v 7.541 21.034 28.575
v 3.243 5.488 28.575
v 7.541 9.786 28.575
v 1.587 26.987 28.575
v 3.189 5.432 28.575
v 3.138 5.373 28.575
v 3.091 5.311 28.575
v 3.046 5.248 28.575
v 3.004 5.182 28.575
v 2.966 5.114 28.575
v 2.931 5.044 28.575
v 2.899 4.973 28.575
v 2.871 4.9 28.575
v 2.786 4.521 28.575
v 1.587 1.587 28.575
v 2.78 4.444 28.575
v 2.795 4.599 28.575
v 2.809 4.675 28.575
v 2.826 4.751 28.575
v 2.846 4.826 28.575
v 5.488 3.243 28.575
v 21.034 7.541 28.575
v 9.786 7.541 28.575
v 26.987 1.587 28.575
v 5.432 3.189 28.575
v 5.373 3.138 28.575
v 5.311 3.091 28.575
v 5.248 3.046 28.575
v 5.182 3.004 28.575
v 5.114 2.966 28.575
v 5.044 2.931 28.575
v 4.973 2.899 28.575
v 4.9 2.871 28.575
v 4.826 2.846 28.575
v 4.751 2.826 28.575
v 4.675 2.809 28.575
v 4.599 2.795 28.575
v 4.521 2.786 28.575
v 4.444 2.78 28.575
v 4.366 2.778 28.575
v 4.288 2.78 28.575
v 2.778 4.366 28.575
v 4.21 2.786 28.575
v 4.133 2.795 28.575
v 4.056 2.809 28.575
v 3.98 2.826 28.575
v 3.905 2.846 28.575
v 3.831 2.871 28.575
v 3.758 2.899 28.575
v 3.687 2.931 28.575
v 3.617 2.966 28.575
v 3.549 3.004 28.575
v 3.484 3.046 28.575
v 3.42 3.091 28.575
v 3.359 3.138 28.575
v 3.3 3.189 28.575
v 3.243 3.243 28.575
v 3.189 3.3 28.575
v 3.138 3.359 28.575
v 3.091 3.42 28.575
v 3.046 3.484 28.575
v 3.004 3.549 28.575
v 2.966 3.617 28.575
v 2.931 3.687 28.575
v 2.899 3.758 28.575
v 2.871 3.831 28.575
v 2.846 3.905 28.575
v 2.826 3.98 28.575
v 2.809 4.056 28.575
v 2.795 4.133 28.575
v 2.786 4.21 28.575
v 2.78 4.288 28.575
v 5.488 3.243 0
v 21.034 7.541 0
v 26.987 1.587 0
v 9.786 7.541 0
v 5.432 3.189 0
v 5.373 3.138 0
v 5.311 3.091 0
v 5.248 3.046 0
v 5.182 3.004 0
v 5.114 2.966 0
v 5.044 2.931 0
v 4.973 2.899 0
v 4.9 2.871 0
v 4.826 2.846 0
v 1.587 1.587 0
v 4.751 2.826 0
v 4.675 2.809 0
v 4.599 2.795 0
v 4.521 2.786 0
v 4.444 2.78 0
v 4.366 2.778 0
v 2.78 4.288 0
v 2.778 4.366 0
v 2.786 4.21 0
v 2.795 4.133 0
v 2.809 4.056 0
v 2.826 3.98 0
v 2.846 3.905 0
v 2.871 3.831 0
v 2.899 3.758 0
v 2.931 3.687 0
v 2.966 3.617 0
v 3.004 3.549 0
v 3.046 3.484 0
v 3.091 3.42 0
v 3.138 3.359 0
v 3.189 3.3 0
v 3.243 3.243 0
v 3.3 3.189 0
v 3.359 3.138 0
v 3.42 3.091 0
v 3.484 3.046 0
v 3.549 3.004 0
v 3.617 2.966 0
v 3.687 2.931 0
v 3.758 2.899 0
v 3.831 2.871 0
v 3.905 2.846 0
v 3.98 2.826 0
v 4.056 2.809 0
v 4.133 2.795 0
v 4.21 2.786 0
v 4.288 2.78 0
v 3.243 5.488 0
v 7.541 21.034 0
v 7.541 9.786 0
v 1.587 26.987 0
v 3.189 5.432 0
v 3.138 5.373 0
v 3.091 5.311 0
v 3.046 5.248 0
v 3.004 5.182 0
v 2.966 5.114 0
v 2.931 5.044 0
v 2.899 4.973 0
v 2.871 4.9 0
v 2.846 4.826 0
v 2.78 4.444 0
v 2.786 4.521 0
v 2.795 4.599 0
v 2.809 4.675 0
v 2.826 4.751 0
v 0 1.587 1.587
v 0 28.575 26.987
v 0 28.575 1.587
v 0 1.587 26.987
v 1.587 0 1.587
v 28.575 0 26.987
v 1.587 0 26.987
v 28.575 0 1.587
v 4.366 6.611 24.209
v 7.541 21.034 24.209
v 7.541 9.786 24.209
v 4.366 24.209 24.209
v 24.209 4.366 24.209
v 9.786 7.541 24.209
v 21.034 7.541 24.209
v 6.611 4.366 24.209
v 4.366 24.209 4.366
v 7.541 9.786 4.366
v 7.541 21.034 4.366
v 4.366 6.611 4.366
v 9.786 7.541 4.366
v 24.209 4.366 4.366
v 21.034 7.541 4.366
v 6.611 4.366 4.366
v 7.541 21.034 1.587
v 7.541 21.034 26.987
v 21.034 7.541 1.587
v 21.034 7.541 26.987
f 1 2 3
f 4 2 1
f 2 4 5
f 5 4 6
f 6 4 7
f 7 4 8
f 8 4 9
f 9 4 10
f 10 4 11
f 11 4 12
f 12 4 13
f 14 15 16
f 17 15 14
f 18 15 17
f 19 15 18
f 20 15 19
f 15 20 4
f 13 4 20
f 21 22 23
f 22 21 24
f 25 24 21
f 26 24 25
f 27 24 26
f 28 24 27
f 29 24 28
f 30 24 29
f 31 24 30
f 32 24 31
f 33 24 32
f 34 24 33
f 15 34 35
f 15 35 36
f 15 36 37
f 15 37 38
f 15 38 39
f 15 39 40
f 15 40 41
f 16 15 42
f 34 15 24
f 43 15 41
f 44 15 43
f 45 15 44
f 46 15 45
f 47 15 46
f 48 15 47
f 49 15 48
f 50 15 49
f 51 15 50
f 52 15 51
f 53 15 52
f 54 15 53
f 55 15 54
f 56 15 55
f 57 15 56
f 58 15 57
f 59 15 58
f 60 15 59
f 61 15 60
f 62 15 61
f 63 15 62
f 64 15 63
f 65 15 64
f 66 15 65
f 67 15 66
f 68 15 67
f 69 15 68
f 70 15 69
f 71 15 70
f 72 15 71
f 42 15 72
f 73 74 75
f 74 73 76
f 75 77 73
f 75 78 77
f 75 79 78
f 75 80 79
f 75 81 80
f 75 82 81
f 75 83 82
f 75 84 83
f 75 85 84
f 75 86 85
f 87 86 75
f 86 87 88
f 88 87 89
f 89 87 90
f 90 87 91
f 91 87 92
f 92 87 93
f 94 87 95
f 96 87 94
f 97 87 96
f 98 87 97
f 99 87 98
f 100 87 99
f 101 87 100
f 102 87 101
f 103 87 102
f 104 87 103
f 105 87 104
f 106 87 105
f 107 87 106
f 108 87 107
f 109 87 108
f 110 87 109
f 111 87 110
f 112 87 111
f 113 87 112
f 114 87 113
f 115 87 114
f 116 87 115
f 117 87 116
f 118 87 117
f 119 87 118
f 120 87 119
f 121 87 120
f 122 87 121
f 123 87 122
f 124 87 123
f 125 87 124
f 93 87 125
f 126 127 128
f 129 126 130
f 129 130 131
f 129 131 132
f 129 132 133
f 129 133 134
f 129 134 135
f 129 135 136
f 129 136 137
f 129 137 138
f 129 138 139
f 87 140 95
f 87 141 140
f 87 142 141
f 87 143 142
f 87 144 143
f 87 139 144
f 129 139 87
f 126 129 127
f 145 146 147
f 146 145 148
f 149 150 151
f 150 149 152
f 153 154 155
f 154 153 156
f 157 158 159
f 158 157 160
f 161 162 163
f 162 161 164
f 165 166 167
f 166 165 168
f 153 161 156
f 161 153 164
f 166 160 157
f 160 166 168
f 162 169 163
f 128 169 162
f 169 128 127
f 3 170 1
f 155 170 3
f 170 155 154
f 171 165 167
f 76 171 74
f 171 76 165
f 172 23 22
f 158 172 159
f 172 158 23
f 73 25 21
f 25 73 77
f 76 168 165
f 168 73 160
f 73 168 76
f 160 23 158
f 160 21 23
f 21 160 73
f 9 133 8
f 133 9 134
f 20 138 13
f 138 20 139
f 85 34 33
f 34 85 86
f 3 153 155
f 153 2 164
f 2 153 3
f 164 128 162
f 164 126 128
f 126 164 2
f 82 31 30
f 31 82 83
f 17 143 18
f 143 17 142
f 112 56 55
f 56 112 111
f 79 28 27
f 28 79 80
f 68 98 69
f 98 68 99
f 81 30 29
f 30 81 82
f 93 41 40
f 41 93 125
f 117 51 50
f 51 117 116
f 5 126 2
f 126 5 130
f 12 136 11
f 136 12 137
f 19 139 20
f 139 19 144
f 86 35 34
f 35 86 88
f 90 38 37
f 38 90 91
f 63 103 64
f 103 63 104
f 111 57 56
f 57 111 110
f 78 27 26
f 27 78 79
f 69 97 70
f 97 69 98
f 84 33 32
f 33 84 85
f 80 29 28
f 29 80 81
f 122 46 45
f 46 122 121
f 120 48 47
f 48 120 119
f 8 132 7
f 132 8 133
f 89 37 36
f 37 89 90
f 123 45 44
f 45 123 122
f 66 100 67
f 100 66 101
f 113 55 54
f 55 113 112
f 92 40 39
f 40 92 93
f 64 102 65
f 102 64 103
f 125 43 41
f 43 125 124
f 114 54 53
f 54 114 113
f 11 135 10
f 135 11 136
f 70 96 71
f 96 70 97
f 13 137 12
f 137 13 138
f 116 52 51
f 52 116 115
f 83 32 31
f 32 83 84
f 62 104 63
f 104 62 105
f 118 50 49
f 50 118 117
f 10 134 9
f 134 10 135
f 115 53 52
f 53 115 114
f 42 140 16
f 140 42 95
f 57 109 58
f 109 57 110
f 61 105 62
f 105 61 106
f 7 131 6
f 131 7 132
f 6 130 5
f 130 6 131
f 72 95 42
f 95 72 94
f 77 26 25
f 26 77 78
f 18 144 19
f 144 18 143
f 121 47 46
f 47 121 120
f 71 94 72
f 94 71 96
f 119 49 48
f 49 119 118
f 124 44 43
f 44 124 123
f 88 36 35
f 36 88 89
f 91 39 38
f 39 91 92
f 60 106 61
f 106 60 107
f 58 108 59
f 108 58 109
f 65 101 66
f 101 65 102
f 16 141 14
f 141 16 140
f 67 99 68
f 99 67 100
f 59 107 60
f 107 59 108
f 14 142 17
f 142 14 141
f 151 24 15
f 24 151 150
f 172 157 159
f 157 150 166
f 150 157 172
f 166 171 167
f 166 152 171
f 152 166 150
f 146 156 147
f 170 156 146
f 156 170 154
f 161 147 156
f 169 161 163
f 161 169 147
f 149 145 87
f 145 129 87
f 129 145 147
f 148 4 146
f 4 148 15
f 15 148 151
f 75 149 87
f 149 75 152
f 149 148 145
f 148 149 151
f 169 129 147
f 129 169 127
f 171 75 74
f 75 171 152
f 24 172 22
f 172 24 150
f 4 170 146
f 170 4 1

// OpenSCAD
/**
 * Corner spacer for clamping a mitered frame: a right-triangle block with a slot that holds the
 * frame corner. All dimensions are in millimeters.
 */

/* [Frame] */
// Frame thickness (19.84375 for 25/32")
Frame_Thickness = 19.84375;

// Frame edge width the spacer overlaps (3.175 for 1/8")
Frame_Overhang = 3.175;

/* [Spacer] */
// Spacer thickness (28.575 for 1-1/8")
Holder_Thickness = 28.575;

// Diameter of the relief cut into the inside corner (3.175 for 1/8")
Corner_Relief_Diameter = 3.175;

// Side length of the square the spacer is cut from, at least Holder_Thickness (30 for 1-3/16")
Length = 30;

// Chamfer on the outer edges (1.5875 for 1/16") (0 to disable)
Edge_Chamfer = 1.5875;

/* [Hidden] */
$fn = 128;

wall_thickness = (Holder_Thickness - Frame_Thickness) / 2;

assert(Frame_Thickness < Holder_Thickness, "Frame_Thickness must be less than Holder_Thickness");
assert(Length >= Holder_Thickness, "Length must be at least Holder_Thickness");
assert(Edge_Chamfer >= 0 && Edge_Chamfer < wall_thickness, "Edge_Chamfer must be at least 0 and less than the wall thickness");

module CornerRelief() {
  l = Frame_Overhang + Corner_Relief_Diameter / 2;
  translate([0, 0, -1]) hull() {
    cylinder(d = Corner_Relief_Diameter, h = Holder_Thickness + 2);
    translate([l, l, 0]) cylinder(d = Corner_Relief_Diameter, h = Holder_Thickness + 2);
  }
}

module Body() {
  x = Holder_Thickness * sqrt(2);

  intersection() {
    difference() {
      cube([Length, Length, Holder_Thickness]);
      translate([wall_thickness, wall_thickness, wall_thickness]) cube([Length + 1, Length + 1, Frame_Thickness]);
      translate([wall_thickness + Frame_Overhang, wall_thickness + Frame_Overhang, -1]) cube([Length + 1, Length + 1, Holder_Thickness + 2]);
      translate([wall_thickness, wall_thickness, 0]) CornerRelief();
    }

    rotate([0, 0, 45]) translate([-x / 2, -x / 2, -1]) cube([x, x, Holder_Thickness + 2]);
  }
}

// The triangular outline of the spacer with the outer corner and the two outer leg edges chamfered; the diagonal face stays sharp.
module ChamferedOutline() {
  c = Edge_Chamfer;
  h = Holder_Thickness;
  hull() {
    translate([0, 0, c]) linear_extrude(height = h - 2 * c) polygon([[c, 0], [h, 0], [0, h], [0, c]]);
    for (z = [0, h - 0.001]) translate([0, 0, z]) linear_extrude(height = 0.001) polygon([[c, c], [h - c, c], [c, h - c]]);
  }
}

module Spacer() {
  if (Edge_Chamfer > 0) intersection() {
      Body();
      ChamferedOutline();
    }
  else Body();
}

Spacer();
